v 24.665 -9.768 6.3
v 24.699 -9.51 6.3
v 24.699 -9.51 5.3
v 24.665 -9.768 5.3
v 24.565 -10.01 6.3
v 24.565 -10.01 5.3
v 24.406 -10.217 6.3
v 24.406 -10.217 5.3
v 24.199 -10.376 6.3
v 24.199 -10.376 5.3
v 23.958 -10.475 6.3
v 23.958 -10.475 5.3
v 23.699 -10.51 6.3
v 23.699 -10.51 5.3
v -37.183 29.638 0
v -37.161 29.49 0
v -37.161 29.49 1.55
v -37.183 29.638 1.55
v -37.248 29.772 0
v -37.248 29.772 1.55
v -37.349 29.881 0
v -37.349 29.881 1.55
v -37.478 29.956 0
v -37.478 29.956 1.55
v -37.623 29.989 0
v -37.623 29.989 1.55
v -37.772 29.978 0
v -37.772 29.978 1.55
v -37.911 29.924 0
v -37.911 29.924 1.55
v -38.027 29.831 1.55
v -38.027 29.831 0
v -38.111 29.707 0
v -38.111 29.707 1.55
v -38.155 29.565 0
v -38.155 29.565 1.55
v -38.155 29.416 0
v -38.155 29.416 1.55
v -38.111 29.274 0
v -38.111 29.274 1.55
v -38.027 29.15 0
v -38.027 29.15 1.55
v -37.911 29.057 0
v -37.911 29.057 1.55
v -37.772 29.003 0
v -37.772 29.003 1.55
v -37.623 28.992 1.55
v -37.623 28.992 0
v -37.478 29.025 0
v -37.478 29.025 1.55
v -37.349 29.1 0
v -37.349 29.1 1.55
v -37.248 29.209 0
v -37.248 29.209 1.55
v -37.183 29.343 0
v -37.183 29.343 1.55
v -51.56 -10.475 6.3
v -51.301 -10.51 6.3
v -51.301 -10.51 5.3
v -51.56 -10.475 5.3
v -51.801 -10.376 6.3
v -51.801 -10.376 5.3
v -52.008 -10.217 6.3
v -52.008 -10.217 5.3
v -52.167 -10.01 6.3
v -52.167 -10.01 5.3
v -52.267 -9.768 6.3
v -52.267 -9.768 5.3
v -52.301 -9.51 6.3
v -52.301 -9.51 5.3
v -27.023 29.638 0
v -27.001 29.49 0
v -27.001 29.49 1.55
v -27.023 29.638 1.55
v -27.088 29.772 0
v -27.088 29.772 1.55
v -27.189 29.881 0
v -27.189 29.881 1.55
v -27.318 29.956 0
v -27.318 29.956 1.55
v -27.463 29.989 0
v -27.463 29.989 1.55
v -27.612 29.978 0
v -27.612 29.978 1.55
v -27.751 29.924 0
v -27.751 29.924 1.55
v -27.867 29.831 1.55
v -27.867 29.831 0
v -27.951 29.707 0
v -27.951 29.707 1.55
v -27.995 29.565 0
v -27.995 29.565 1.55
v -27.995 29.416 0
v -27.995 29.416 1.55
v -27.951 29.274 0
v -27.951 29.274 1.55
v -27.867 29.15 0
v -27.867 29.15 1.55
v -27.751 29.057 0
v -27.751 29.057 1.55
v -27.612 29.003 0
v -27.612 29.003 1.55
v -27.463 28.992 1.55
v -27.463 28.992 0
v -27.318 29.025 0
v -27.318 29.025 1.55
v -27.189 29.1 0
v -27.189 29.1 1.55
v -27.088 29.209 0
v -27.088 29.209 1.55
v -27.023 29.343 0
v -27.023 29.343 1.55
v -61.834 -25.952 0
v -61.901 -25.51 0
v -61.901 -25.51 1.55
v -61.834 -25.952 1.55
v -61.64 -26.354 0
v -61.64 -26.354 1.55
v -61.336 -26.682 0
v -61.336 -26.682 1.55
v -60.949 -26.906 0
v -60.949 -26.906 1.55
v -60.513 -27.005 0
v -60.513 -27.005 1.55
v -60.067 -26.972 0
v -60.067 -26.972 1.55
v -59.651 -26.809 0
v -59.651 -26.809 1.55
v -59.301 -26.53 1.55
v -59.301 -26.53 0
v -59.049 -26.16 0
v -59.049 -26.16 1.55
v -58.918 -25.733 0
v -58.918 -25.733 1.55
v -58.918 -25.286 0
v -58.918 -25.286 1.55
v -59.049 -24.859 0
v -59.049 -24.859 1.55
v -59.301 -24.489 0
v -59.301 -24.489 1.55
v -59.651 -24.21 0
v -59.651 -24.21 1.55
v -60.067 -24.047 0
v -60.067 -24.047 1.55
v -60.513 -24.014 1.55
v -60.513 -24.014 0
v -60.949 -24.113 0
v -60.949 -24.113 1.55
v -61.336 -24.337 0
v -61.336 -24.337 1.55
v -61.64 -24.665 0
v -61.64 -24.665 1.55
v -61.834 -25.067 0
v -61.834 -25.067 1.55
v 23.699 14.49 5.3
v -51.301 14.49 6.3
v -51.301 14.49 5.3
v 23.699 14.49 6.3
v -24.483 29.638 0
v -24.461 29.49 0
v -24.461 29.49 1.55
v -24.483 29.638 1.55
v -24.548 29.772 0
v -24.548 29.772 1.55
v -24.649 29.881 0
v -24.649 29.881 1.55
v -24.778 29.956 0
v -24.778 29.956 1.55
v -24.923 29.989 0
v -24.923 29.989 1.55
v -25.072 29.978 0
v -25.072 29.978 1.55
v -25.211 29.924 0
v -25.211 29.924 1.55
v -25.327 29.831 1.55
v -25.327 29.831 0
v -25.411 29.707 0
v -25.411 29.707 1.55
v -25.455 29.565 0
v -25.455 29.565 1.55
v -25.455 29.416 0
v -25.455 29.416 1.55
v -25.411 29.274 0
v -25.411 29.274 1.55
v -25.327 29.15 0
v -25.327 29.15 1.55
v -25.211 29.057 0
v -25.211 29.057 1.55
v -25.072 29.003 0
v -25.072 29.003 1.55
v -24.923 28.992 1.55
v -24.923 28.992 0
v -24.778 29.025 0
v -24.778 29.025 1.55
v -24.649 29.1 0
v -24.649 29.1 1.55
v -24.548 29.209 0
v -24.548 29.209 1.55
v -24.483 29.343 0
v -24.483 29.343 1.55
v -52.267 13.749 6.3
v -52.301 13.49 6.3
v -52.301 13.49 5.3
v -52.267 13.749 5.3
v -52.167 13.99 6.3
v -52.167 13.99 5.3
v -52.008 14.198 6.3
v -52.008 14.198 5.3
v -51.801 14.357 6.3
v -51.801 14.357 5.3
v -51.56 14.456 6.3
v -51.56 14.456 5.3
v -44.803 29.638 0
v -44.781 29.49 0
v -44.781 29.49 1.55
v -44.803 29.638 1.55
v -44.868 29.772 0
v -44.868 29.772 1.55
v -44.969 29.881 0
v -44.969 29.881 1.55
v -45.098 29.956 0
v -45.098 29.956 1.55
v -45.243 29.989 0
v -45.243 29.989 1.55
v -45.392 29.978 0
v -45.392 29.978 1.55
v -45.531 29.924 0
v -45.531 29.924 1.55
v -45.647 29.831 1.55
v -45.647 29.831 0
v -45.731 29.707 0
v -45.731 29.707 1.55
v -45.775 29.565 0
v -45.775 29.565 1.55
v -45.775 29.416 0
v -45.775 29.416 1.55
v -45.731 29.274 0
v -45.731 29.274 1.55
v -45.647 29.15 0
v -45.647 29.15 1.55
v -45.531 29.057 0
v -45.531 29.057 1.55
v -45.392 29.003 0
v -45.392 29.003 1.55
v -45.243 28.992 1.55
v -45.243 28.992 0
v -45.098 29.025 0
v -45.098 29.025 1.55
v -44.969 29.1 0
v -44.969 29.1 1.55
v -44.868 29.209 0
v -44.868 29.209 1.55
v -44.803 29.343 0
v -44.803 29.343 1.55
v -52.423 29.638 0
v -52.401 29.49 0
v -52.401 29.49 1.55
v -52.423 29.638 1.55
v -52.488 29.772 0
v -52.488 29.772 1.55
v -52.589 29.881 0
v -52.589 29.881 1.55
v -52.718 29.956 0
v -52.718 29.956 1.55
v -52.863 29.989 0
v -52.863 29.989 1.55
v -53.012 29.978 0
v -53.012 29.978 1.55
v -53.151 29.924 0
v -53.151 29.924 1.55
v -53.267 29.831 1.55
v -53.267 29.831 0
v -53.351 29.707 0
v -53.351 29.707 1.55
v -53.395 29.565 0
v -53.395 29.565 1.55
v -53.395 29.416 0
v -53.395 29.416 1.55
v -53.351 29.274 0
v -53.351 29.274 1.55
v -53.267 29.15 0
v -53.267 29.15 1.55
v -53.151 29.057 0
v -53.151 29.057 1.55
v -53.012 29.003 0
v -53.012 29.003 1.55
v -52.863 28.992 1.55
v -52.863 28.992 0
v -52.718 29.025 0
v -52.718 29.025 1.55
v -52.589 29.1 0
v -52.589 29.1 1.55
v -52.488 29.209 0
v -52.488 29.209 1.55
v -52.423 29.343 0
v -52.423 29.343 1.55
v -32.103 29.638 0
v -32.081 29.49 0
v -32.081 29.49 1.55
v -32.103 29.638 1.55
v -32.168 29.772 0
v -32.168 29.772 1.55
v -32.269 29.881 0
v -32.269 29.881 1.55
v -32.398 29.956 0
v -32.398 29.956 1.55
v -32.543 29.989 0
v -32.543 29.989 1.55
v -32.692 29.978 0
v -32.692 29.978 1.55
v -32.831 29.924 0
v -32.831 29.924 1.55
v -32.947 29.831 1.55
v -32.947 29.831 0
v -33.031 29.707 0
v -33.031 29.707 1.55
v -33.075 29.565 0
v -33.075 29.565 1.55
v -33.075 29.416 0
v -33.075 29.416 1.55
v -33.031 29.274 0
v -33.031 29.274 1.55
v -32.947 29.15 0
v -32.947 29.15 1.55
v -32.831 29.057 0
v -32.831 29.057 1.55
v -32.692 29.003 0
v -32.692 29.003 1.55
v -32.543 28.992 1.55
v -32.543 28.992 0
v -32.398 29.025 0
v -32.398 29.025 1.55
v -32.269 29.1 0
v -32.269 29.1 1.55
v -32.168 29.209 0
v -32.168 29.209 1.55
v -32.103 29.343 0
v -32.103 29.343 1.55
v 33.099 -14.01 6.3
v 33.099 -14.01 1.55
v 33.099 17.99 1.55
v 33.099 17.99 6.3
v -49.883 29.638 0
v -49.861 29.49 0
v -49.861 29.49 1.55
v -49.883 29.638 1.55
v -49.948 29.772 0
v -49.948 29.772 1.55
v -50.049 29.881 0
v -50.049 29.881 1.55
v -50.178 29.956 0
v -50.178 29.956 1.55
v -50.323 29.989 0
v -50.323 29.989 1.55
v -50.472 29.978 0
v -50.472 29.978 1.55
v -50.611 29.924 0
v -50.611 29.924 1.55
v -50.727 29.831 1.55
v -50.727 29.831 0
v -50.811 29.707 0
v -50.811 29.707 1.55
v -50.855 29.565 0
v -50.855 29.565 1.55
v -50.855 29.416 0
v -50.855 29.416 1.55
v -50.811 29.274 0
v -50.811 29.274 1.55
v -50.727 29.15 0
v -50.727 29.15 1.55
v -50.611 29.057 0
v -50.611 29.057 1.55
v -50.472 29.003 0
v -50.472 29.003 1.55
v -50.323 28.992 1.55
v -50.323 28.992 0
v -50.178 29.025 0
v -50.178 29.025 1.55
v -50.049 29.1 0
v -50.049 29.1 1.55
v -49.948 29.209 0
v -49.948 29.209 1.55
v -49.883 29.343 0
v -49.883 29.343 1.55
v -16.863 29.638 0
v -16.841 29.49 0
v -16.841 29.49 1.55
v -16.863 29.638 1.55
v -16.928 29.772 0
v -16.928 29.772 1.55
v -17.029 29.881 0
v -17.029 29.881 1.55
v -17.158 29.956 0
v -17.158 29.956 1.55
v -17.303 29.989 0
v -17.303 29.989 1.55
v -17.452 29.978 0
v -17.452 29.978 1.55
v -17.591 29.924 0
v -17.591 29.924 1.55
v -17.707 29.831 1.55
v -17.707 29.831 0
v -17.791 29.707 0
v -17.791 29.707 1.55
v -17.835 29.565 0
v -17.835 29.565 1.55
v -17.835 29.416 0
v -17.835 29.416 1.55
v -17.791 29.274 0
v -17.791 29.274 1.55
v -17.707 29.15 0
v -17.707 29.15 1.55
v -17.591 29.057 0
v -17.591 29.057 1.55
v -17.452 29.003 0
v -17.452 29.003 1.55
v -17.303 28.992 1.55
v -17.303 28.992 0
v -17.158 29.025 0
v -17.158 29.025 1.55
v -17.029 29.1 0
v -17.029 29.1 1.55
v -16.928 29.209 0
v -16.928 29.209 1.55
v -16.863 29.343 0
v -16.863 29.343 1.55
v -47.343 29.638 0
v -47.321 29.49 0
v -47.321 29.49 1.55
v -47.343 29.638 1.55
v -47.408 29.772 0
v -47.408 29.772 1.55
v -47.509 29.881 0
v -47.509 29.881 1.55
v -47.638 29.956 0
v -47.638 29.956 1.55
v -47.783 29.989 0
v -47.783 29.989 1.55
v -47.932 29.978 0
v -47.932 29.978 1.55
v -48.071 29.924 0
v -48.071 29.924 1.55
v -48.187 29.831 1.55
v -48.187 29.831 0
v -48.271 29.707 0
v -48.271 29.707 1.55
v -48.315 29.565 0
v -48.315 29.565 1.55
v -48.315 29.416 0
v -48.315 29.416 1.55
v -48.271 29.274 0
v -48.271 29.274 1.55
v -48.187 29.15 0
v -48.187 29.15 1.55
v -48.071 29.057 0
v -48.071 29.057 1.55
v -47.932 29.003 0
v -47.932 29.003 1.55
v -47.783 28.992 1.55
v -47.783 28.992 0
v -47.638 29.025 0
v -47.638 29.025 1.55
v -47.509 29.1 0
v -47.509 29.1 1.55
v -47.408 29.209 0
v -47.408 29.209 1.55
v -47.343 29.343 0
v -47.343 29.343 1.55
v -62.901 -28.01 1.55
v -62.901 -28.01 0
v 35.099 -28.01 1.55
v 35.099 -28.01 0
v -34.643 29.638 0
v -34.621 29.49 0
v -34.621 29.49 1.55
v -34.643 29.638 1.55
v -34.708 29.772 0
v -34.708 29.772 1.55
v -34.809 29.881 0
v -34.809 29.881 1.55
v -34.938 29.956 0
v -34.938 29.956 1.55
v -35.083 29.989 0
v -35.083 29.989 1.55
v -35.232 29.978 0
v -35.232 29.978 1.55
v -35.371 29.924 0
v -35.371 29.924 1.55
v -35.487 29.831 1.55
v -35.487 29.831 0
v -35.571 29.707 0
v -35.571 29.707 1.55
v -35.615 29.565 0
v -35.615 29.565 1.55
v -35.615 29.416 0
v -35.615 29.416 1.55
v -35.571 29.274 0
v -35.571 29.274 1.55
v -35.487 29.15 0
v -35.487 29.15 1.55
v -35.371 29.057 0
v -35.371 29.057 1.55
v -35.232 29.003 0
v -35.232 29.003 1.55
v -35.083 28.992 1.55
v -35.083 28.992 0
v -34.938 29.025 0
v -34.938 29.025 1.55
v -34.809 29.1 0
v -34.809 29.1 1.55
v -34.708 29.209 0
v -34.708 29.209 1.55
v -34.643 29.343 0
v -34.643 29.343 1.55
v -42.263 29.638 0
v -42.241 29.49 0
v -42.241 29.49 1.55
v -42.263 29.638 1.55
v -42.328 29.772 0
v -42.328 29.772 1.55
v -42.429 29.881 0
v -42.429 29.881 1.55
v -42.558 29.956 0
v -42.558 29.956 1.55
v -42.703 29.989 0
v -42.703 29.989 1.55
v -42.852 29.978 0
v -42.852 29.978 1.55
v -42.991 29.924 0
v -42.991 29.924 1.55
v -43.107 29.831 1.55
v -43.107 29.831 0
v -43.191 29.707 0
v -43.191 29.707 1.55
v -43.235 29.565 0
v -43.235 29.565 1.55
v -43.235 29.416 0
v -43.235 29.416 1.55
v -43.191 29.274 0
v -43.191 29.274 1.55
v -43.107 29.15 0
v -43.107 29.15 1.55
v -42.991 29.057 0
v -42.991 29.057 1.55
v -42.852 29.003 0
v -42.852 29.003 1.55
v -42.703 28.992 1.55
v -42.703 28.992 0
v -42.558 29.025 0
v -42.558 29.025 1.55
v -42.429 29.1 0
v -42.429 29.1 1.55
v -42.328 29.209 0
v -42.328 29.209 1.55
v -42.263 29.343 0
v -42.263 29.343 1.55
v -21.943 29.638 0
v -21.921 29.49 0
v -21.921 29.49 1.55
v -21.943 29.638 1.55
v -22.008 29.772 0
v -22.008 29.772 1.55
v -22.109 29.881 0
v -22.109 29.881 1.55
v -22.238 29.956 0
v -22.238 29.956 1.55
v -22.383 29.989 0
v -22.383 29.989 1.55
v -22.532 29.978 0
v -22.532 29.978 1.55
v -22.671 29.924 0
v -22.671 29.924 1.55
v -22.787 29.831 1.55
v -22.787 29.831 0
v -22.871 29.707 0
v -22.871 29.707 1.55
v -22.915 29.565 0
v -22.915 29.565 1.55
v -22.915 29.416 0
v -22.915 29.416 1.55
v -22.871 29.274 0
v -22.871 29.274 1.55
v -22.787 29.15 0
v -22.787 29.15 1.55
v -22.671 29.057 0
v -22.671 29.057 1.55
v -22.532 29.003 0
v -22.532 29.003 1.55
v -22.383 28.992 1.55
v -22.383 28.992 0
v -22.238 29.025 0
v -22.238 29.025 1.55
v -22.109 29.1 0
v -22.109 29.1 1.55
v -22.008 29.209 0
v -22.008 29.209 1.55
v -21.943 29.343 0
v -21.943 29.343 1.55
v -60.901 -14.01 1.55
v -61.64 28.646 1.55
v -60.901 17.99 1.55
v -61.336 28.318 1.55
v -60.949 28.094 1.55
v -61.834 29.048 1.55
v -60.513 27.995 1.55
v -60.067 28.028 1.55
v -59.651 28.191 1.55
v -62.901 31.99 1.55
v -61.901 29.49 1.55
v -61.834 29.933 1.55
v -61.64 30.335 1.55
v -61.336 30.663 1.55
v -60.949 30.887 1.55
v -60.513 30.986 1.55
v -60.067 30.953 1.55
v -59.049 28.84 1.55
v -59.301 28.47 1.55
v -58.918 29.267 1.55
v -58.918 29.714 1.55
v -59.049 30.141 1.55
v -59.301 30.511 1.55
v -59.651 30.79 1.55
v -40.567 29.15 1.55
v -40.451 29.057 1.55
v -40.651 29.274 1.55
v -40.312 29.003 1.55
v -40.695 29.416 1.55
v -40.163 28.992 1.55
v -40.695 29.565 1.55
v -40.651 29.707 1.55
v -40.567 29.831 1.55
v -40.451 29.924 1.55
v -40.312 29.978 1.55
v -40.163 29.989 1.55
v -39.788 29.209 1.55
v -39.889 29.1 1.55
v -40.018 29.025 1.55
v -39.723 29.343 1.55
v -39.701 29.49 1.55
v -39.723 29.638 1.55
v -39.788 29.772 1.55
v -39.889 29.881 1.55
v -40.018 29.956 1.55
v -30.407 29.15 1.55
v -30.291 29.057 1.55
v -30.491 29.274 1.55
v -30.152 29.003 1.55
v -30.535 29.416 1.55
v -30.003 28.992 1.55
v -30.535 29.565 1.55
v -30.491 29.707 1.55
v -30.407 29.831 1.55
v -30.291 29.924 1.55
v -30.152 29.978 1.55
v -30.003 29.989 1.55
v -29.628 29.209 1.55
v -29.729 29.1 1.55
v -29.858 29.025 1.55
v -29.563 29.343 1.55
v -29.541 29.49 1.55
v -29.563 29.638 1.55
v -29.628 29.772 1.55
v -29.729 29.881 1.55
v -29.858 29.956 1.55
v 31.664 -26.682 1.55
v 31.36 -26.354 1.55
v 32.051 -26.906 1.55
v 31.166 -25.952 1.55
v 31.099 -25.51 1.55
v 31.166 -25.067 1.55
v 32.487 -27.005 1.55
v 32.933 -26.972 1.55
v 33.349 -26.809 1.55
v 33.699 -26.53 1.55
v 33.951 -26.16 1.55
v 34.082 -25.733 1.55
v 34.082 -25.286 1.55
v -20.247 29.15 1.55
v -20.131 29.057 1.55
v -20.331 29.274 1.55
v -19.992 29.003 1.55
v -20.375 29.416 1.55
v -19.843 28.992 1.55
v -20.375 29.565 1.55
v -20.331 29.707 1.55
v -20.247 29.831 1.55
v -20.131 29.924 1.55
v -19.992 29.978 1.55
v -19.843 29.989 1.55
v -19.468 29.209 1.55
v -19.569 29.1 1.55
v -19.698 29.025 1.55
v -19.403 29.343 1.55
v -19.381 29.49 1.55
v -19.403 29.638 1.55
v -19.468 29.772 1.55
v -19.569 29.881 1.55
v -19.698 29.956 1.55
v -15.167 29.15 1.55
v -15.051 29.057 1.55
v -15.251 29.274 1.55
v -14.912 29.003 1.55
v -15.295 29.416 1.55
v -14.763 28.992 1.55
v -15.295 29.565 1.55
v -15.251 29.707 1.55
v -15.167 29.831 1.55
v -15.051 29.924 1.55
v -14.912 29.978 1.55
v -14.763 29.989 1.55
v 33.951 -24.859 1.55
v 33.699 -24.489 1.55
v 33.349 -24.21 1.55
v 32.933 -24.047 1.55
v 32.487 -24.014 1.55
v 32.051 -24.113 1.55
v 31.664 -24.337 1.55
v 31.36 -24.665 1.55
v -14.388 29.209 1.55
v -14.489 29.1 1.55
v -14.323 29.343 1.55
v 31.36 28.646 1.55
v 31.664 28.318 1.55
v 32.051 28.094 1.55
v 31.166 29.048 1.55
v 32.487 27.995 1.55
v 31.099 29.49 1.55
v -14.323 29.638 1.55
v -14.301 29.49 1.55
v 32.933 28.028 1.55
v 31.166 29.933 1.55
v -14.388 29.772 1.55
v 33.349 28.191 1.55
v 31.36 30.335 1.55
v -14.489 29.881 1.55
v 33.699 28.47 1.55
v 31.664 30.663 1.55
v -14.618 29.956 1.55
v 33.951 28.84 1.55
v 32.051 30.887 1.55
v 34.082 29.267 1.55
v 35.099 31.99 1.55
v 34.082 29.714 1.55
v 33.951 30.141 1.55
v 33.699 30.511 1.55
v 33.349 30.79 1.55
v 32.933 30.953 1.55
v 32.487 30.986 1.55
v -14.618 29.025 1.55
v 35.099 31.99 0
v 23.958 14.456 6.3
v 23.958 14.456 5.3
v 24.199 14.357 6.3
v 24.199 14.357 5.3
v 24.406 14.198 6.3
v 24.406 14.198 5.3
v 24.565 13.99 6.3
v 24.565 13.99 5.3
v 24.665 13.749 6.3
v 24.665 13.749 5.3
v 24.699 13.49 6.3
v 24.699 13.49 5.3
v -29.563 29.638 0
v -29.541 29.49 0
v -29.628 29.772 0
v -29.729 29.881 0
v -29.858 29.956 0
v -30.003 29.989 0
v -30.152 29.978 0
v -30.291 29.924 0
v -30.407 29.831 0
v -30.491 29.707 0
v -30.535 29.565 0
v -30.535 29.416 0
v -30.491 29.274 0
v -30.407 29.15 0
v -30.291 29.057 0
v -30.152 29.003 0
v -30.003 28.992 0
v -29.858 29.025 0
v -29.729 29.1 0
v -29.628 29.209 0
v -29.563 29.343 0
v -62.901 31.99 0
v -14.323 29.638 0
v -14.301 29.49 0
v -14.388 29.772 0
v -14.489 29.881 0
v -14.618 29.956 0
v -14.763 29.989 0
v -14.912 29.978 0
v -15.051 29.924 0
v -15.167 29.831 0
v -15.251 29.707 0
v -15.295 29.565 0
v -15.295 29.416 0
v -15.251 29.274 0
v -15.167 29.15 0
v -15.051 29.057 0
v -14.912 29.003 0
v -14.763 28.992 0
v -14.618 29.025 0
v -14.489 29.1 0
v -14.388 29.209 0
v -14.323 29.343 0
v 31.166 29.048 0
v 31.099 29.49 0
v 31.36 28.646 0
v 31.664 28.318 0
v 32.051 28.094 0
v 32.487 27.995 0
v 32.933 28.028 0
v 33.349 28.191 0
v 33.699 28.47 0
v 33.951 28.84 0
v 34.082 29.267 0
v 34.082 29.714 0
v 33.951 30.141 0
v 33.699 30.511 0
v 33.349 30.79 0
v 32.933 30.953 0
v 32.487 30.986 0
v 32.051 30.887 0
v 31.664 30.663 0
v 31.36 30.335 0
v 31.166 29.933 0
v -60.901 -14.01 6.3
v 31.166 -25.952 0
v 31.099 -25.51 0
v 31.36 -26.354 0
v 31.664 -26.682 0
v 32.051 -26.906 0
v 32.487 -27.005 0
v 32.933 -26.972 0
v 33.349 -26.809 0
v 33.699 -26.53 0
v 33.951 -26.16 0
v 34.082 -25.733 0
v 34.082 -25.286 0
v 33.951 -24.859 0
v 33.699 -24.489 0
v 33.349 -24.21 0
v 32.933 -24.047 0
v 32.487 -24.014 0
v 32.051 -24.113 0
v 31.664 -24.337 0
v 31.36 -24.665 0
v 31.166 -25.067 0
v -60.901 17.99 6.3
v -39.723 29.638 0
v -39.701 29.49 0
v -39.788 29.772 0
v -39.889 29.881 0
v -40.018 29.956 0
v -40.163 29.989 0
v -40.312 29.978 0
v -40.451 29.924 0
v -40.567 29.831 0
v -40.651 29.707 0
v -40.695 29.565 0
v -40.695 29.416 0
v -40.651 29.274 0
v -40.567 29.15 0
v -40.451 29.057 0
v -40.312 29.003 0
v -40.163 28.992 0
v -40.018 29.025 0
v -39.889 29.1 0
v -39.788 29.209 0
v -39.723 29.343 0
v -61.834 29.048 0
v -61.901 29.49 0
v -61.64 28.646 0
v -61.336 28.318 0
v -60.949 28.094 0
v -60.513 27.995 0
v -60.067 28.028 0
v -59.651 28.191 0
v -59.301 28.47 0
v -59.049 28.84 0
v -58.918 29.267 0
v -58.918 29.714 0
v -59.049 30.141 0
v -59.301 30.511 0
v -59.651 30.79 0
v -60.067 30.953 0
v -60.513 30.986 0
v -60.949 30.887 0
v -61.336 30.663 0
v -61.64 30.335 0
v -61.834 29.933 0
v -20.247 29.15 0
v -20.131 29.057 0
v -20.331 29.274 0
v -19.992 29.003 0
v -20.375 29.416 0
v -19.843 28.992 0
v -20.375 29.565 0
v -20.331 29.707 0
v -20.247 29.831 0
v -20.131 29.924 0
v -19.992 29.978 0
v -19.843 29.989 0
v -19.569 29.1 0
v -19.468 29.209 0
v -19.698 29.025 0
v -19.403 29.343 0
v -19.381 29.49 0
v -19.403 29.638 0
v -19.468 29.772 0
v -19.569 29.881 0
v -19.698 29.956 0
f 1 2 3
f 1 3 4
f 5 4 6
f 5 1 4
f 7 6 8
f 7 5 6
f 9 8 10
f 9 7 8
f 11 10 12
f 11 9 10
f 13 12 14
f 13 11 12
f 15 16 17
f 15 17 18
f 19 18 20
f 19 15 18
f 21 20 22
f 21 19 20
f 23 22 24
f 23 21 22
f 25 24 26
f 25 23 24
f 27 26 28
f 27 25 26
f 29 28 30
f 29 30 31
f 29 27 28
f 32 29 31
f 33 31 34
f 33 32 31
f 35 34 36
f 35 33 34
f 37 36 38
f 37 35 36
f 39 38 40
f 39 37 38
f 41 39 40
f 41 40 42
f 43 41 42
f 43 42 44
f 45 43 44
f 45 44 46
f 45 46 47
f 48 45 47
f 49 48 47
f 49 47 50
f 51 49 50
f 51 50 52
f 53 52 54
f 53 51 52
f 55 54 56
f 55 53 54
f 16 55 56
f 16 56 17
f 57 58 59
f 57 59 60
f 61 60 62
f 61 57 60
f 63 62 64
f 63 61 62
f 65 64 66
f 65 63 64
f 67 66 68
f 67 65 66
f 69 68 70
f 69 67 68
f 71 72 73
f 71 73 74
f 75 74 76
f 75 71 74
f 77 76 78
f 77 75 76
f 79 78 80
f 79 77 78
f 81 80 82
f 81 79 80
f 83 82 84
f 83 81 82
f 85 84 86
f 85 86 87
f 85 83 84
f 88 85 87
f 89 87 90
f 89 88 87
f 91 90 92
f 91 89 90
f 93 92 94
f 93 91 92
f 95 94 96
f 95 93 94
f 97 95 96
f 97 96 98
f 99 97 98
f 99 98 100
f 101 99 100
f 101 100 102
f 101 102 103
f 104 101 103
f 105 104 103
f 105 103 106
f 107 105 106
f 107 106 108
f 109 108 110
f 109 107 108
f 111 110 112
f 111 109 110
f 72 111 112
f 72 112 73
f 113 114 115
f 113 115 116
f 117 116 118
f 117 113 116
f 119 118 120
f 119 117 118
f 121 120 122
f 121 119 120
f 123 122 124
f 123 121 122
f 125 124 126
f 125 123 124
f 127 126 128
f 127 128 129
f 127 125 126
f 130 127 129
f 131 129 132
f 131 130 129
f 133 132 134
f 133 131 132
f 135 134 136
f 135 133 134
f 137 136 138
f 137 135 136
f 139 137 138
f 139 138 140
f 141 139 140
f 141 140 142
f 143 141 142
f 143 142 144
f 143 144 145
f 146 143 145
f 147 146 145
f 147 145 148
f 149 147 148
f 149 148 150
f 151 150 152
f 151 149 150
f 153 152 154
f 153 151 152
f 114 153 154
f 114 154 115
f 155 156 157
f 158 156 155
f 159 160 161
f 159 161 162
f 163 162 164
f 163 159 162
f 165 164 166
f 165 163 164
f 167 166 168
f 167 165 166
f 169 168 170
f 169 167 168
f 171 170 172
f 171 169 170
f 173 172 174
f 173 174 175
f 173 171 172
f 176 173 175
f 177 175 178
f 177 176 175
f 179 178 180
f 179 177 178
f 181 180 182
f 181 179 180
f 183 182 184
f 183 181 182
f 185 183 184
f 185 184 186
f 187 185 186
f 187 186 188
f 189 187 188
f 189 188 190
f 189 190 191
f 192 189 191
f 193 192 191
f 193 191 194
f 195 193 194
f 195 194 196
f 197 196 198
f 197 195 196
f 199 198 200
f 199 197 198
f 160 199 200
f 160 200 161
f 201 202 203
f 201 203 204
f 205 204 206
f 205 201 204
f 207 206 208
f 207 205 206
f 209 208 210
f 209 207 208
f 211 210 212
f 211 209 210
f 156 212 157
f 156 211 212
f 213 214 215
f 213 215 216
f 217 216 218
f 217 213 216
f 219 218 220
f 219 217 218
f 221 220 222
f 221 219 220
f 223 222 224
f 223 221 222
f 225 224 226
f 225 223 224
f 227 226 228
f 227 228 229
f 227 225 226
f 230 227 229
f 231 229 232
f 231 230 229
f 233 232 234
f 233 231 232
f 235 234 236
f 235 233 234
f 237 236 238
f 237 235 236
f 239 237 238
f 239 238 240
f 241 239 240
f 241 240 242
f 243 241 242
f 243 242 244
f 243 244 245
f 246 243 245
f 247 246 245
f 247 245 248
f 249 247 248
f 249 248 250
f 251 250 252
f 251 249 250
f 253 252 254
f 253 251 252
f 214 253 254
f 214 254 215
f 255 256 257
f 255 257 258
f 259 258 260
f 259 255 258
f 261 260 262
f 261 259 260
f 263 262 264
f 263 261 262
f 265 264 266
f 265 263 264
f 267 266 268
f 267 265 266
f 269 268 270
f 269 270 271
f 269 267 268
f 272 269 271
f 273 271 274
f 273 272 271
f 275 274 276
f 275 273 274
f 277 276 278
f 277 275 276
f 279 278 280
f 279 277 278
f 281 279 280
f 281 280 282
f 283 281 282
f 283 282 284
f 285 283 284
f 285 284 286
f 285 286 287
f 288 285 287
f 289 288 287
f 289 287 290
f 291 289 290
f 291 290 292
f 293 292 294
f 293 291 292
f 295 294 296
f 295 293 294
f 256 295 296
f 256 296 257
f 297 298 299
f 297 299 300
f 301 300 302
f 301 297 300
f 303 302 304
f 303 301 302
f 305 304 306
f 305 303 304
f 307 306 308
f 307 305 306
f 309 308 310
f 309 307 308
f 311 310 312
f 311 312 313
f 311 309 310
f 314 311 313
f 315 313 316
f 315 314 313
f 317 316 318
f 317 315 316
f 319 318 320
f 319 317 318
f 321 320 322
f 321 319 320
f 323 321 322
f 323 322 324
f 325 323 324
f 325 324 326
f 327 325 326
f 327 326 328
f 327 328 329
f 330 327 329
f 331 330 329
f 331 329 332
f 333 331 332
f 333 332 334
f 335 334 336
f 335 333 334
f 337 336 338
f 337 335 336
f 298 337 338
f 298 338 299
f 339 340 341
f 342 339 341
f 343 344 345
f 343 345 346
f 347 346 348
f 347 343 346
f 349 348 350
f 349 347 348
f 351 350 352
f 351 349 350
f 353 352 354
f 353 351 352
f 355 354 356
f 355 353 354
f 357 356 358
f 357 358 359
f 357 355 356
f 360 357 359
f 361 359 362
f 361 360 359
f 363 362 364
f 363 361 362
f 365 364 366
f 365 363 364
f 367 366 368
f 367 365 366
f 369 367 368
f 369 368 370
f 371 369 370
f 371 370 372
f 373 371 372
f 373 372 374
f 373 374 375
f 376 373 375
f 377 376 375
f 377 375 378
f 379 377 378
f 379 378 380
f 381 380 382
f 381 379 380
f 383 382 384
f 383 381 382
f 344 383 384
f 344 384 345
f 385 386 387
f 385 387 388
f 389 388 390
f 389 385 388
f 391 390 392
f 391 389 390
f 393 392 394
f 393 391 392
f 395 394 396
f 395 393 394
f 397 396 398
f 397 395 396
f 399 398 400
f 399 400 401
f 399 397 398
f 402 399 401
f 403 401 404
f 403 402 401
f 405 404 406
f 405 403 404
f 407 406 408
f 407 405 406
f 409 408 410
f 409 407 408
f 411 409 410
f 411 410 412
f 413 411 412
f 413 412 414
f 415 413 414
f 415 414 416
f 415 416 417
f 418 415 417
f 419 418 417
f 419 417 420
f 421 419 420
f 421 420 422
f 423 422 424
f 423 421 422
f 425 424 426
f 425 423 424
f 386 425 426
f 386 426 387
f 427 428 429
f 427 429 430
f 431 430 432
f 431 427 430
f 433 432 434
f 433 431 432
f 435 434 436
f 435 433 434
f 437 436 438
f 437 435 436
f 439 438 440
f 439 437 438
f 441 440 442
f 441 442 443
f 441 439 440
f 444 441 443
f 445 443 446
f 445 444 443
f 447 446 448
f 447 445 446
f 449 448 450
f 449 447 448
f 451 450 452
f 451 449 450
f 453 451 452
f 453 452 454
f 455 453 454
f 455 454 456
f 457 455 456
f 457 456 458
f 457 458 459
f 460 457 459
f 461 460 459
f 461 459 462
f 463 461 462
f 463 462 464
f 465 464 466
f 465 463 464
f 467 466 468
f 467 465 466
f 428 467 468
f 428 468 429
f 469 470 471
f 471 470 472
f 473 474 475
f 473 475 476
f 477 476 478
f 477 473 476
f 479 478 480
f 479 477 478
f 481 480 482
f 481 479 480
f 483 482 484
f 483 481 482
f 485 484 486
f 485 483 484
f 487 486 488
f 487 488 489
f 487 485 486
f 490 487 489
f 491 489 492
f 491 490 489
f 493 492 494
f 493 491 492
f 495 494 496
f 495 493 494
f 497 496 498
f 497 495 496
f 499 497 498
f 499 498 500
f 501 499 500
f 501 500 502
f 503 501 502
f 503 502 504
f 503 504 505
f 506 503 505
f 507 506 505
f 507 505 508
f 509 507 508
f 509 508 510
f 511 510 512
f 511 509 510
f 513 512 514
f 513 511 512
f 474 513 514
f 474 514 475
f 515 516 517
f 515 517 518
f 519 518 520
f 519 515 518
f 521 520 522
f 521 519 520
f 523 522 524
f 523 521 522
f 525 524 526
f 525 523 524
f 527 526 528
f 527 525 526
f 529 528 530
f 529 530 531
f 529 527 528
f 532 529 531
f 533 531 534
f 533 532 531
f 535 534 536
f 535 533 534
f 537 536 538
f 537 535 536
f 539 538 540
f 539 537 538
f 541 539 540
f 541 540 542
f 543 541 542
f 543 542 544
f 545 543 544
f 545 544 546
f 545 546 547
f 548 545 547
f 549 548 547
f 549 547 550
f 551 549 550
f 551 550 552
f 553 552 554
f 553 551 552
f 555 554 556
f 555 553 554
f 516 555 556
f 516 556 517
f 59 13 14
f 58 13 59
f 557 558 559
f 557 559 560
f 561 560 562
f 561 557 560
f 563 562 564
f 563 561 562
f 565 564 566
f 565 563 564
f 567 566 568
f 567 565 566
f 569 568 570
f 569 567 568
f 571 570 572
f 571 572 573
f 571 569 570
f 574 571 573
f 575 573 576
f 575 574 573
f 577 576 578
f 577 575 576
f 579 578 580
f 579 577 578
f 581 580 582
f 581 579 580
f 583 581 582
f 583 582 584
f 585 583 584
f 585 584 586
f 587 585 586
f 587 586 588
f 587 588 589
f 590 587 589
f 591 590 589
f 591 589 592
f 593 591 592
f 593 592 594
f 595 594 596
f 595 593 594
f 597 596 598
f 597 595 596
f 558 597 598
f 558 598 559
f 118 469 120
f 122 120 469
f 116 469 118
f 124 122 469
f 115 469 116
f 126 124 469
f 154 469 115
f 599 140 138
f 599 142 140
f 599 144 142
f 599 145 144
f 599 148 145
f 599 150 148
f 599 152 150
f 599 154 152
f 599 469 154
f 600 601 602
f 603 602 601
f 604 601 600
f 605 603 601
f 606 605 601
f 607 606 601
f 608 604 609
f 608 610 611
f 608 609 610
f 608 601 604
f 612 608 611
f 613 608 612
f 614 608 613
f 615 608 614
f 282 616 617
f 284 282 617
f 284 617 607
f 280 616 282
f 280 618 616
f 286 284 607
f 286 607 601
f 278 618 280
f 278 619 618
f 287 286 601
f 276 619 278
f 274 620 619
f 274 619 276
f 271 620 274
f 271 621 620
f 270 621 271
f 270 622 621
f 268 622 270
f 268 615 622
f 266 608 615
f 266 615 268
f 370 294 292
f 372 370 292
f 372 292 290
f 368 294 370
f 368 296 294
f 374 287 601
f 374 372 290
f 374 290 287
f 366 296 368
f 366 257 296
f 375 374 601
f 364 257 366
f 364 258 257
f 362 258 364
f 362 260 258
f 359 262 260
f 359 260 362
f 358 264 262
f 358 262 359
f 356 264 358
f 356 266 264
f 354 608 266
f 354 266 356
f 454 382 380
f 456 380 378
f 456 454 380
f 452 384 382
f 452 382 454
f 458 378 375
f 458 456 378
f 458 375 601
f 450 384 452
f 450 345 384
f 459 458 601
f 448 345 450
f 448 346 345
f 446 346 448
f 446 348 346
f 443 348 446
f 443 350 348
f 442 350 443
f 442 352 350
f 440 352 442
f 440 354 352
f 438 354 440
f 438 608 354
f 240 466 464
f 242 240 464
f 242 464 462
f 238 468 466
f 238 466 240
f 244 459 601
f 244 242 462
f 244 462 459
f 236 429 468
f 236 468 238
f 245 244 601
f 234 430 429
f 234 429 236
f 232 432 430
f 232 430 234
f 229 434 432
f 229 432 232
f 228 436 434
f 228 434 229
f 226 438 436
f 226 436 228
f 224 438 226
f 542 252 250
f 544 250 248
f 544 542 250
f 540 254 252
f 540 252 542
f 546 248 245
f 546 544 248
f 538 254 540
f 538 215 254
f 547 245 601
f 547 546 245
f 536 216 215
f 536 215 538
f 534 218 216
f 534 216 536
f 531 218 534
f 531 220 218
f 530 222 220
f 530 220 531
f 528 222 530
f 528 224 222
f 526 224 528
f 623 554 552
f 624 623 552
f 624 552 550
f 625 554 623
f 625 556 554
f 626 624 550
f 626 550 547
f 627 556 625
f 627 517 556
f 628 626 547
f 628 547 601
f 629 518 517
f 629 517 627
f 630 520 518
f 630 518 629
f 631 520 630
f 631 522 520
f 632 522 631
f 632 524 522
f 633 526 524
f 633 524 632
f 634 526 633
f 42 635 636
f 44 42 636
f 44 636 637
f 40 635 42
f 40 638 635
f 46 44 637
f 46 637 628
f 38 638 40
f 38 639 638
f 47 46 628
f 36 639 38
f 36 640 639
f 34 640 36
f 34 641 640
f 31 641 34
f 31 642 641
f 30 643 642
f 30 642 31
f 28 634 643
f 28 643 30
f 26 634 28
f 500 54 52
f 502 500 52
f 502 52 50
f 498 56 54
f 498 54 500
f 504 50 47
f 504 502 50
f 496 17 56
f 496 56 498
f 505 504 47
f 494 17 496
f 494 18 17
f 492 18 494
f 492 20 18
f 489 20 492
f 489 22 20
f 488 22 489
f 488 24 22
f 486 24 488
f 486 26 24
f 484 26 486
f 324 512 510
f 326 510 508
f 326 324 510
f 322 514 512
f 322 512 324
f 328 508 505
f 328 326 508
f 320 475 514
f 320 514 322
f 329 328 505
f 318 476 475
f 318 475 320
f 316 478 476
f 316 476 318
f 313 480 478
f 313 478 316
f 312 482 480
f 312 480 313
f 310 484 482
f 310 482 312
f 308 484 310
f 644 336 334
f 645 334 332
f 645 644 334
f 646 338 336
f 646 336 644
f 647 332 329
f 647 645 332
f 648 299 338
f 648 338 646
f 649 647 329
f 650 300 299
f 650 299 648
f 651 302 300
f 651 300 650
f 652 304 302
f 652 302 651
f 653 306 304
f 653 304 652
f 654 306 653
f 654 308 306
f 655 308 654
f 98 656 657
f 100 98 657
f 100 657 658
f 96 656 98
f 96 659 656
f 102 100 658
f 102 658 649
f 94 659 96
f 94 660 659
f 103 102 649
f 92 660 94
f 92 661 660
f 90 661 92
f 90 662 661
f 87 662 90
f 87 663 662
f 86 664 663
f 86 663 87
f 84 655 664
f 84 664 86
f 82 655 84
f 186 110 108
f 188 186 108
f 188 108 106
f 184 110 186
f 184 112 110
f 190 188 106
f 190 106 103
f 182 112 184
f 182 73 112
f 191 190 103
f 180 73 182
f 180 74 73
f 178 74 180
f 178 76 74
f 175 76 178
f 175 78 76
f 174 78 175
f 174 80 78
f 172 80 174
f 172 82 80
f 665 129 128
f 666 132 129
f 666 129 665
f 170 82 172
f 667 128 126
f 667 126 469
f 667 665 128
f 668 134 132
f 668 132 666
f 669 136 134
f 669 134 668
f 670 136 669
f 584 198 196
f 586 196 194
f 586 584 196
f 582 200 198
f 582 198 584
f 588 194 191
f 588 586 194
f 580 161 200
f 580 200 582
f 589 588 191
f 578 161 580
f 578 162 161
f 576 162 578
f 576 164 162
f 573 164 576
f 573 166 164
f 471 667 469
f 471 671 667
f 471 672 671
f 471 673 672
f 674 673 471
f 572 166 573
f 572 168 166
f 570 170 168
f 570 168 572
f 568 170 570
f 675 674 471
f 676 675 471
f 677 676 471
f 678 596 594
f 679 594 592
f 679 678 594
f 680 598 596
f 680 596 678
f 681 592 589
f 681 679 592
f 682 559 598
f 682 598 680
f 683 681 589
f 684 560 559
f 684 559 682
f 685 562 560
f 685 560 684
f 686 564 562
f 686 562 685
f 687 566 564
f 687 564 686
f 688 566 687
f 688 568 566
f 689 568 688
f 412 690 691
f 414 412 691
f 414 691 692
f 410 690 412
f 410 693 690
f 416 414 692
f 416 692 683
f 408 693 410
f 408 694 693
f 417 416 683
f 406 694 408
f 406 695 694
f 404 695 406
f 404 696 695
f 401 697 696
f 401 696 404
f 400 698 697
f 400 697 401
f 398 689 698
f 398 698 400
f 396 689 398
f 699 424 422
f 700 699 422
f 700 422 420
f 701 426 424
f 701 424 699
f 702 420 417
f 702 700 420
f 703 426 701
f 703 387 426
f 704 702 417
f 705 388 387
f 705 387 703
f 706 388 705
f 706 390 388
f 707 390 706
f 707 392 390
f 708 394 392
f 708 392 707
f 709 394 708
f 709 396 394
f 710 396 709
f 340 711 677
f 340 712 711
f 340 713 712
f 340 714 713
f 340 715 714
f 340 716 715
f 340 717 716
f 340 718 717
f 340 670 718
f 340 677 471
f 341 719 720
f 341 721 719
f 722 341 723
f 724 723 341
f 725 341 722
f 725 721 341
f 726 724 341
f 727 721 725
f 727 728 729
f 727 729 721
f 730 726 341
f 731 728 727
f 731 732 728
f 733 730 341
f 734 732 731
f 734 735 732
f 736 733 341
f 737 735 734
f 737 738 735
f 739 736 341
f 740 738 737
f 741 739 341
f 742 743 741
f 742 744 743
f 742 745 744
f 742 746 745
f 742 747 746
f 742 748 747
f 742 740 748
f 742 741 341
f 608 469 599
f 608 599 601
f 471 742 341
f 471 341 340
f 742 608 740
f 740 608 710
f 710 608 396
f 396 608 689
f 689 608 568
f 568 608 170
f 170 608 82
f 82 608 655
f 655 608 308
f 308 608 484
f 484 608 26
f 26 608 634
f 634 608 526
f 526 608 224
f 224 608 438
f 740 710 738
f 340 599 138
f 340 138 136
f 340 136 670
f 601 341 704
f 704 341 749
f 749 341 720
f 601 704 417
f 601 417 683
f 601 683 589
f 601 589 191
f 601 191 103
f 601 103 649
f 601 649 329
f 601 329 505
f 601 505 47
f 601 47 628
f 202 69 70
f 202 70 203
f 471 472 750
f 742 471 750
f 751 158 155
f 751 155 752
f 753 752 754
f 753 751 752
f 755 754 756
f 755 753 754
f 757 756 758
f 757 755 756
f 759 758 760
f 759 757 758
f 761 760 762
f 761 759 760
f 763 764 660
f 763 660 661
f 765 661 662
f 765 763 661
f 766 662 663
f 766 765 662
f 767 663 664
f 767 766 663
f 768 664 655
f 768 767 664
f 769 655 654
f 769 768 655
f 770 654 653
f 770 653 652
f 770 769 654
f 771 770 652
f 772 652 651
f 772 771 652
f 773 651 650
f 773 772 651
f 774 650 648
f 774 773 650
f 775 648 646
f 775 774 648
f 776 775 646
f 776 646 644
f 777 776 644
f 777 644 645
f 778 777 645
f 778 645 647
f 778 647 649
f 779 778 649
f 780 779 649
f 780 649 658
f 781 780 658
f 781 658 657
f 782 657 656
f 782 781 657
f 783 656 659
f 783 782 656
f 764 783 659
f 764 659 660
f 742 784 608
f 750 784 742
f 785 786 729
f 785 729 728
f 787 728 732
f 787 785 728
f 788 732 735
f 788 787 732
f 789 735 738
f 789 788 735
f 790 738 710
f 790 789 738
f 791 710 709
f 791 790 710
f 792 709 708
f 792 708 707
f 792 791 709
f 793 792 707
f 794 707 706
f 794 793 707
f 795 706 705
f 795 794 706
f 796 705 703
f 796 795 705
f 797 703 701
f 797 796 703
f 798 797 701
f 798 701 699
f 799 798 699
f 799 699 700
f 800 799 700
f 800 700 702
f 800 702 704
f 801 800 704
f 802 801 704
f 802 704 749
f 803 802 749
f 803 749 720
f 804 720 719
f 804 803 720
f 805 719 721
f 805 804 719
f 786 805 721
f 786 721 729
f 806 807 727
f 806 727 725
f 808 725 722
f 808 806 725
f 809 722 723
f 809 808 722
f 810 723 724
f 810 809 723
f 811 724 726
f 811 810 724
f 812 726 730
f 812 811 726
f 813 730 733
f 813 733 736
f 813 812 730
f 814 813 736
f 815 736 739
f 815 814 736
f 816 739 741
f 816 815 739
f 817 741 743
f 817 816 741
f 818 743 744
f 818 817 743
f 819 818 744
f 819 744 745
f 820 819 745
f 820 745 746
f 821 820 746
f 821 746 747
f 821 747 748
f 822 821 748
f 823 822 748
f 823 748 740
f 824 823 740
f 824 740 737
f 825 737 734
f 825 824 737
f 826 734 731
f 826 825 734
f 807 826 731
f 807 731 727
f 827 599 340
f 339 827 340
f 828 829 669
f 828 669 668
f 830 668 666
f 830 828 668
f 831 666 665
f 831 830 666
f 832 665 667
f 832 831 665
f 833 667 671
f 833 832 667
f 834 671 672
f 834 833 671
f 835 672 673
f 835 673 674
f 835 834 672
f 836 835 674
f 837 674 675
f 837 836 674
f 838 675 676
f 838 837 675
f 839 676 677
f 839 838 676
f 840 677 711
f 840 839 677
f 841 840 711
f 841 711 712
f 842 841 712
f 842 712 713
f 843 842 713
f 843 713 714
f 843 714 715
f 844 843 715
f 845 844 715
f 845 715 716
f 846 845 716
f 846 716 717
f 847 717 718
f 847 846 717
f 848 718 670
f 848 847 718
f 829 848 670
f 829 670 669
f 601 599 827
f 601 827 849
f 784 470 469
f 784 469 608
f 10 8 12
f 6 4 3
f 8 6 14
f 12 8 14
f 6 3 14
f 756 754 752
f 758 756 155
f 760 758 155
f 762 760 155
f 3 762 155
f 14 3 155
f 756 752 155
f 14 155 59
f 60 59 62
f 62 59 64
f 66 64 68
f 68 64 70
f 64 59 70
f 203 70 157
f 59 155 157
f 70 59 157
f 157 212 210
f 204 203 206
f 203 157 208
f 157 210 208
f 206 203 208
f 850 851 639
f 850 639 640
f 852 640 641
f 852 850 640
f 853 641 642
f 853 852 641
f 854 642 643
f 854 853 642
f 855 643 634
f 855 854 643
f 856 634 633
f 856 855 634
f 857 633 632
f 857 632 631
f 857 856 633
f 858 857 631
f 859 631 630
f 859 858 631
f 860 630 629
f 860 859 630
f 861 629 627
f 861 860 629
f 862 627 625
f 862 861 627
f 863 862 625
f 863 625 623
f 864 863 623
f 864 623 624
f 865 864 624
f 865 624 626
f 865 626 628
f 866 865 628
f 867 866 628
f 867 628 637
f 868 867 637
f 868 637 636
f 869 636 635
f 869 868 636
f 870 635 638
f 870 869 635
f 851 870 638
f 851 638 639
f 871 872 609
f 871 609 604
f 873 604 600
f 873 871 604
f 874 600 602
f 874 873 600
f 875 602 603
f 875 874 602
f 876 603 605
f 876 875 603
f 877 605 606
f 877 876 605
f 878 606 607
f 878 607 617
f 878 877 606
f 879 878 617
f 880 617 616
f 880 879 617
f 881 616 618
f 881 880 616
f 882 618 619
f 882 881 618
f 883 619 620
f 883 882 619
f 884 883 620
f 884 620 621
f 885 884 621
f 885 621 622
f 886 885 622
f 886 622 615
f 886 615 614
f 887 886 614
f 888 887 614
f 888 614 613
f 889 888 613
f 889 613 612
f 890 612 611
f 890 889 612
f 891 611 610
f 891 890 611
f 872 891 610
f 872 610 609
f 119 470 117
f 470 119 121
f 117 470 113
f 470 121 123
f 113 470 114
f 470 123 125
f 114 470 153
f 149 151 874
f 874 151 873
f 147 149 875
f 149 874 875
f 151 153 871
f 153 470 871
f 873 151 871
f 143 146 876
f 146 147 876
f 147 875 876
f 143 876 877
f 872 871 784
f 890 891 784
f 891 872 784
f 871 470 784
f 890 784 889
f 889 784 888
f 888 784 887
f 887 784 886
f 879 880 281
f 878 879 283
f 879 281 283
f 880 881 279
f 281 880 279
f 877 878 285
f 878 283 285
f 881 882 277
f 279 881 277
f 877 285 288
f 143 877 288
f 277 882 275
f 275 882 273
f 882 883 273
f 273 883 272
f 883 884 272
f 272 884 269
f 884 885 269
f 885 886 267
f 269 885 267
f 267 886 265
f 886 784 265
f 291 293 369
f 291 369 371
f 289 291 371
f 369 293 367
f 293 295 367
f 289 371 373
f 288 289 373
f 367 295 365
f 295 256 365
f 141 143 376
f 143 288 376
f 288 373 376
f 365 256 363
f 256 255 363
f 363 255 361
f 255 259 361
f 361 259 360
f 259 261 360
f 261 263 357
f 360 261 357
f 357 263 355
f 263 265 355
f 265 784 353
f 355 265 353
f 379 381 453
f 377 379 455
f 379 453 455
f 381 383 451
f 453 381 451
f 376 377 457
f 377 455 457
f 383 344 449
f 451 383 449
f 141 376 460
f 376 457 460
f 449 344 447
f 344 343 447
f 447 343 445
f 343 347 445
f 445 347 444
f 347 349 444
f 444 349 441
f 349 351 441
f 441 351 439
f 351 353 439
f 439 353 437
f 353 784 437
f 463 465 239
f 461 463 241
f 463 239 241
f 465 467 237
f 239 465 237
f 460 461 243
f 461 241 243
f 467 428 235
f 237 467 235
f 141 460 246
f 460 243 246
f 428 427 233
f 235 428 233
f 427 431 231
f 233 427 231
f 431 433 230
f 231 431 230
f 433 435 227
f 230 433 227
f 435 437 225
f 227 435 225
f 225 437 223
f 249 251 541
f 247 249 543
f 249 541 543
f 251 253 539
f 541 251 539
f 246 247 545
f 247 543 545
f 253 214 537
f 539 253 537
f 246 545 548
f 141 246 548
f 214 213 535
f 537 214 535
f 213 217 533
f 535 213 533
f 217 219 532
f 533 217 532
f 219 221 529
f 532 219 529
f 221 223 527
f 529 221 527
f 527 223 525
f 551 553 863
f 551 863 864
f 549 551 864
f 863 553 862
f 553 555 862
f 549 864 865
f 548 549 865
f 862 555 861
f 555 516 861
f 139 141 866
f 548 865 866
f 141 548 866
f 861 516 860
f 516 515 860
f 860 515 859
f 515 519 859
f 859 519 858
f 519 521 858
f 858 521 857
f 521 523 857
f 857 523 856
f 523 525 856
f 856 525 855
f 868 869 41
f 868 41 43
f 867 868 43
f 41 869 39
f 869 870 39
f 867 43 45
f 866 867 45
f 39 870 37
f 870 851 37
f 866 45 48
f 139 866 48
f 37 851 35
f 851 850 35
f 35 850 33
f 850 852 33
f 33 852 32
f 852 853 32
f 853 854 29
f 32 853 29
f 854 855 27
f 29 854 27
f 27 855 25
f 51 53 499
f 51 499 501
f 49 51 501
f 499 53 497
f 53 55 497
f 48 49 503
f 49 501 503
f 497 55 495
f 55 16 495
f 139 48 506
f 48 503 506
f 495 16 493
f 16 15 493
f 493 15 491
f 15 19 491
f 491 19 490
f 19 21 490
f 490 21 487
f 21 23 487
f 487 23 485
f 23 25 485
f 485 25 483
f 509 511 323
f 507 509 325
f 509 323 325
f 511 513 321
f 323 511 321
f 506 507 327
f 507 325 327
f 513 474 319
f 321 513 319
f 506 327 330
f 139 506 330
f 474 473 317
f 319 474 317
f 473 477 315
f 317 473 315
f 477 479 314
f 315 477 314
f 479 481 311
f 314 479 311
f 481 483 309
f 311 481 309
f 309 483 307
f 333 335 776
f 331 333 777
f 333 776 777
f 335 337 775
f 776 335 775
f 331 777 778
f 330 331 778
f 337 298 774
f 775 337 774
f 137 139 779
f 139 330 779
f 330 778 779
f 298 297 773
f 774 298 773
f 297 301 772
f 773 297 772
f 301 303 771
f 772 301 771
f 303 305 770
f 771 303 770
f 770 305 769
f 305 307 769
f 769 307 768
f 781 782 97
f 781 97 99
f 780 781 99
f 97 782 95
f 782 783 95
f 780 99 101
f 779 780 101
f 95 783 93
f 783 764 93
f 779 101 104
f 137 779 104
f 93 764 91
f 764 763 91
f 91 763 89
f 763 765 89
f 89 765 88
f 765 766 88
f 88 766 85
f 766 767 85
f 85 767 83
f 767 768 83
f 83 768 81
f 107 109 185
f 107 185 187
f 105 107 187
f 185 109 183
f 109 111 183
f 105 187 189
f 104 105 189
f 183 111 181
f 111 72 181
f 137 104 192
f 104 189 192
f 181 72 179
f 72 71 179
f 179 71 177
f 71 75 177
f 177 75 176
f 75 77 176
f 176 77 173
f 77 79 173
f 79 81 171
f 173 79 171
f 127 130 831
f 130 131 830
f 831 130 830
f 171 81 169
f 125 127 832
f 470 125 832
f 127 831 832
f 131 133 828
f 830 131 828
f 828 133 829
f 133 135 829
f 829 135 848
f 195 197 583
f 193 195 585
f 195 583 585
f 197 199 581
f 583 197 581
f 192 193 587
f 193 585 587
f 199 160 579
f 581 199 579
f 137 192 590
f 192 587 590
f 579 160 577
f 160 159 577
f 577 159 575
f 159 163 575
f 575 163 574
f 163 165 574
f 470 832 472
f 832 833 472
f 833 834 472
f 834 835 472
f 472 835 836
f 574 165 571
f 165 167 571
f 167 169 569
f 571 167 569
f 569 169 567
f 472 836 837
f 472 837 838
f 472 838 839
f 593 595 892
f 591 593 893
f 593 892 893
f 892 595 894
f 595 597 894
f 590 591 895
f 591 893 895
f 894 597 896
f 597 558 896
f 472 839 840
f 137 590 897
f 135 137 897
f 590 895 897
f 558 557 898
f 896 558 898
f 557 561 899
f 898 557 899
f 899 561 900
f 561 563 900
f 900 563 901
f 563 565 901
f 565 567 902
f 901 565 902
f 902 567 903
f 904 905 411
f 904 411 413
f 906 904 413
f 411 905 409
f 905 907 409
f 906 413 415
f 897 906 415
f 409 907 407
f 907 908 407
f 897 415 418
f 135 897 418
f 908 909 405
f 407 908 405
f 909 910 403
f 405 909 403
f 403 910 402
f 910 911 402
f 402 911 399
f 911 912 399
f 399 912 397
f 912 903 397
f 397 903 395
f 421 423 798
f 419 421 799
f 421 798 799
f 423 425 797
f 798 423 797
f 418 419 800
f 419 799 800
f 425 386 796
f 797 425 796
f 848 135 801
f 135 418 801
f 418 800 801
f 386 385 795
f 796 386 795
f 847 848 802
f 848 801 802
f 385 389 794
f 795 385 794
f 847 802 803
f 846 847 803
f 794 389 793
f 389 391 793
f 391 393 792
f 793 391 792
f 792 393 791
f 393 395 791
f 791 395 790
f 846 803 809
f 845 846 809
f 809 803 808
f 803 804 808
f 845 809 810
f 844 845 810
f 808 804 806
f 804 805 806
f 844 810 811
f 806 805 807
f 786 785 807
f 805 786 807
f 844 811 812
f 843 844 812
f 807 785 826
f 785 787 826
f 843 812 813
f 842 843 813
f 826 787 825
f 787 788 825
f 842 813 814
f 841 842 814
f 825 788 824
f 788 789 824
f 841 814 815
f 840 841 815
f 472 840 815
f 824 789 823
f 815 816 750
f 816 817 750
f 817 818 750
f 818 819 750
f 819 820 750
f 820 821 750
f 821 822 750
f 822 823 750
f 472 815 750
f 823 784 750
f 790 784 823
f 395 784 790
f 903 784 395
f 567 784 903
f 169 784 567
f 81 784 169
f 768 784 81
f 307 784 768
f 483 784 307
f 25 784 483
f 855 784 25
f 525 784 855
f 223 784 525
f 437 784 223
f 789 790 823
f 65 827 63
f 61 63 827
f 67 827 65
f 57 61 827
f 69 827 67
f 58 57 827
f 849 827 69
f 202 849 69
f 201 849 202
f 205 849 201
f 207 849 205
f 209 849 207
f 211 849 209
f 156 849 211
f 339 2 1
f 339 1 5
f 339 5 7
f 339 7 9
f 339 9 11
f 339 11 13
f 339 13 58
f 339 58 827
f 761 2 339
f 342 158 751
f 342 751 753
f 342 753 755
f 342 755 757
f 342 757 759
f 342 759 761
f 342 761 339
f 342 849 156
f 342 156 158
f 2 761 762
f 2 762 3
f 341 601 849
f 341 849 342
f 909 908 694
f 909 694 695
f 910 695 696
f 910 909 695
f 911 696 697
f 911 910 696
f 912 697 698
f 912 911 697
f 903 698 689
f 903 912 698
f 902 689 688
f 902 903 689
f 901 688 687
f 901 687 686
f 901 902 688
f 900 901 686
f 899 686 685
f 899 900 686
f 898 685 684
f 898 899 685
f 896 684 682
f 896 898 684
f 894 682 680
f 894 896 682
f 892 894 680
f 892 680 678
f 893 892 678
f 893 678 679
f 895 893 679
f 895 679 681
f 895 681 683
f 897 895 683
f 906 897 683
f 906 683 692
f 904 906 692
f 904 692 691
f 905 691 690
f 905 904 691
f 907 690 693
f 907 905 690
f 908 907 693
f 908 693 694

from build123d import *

# Parameters (mm, degrees)
ESQUISSE1_W             = 98
ESQUISSE1_H             = 60
ESQUISSE1_R             = 1.5
ESQUISSE1_R_2           = 0.5
BOSS_EXTRU_1_DEPTH      = 1.55
ESQUISSE2_W             = 94
ESQUISSE2_H             = 32
BOSS_EXTRU_2_DEPTH      = 4.75
ENL_V_MAT_EXTRU_2_DEPTH = 1


with BuildPart() as part:
    # Esquisse1 → Boss.-Extru.1 (new body)
    with BuildSketch(Plane.XY):
        with Locations((-13.900836029, 1.990498339)):
            Rectangle(ESQUISSE1_W, ESQUISSE1_H)
        with Locations(Location((-60.400836029, 29.490498339, 0), (0, 0, 180))):
            Circle(ESQUISSE1_R, mode=Mode.SUBTRACT)
        with Locations(Location((32.599163971, 29.490498339, 0), (0, 0, 180))):
            Circle(ESQUISSE1_R, mode=Mode.SUBTRACT)
        with Locations(Location((32.599163971, -25.509501661, 0), (0, 0, 180))):
            Circle(ESQUISSE1_R, mode=Mode.SUBTRACT)
        with Locations(Location((-60.400836029, -25.509501661, 0), (0, 0, 180))):
            Circle(ESQUISSE1_R, mode=Mode.SUBTRACT)
        with Locations((-52.900836029, 29.490498339)):
            Circle(ESQUISSE1_R_2, mode=Mode.SUBTRACT)
        with Locations((-50.360836029, 29.490498339)):
            Circle(ESQUISSE1_R_2, mode=Mode.SUBTRACT)
        with Locations((-47.820836029, 29.490498339)):
            Circle(ESQUISSE1_R_2, mode=Mode.SUBTRACT)
        with Locations((-45.280836029, 29.490498339)):
            Circle(ESQUISSE1_R_2, mode=Mode.SUBTRACT)
        with Locations((-42.740836029, 29.490498339)):
            Circle(ESQUISSE1_R_2, mode=Mode.SUBTRACT)
        with Locations((-40.200836029, 29.490498339)):
            Circle(ESQUISSE1_R_2, mode=Mode.SUBTRACT)
        with Locations((-37.660836029, 29.490498339)):
            Circle(ESQUISSE1_R_2, mode=Mode.SUBTRACT)
        with Locations((-35.120836029, 29.490498339)):
            Circle(ESQUISSE1_R_2, mode=Mode.SUBTRACT)
        with Locations((-32.580836029, 29.490498339)):
            Circle(ESQUISSE1_R_2, mode=Mode.SUBTRACT)
        with Locations((-30.040836029, 29.490498339)):
            Circle(ESQUISSE1_R_2, mode=Mode.SUBTRACT)
        with Locations((-27.500836029, 29.490498339)):
            Circle(ESQUISSE1_R_2, mode=Mode.SUBTRACT)
        with Locations((-24.960836029, 29.490498339)):
            Circle(ESQUISSE1_R_2, mode=Mode.SUBTRACT)
        with Locations((-22.420836029, 29.490498339)):
            Circle(ESQUISSE1_R_2, mode=Mode.SUBTRACT)
        with Locations((-19.880836029, 29.490498339)):
            Circle(ESQUISSE1_R_2, mode=Mode.SUBTRACT)
        with Locations((-17.340836029, 29.490498339)):
            Circle(ESQUISSE1_R_2, mode=Mode.SUBTRACT)
        with Locations((-14.800836029, 29.490498339)):
            Circle(ESQUISSE1_R_2, mode=Mode.SUBTRACT)
    extrude(amount=BOSS_EXTRU_1_DEPTH)

    # Esquisse2 → Boss.-Extru.2 (add)
    with BuildSketch(Plane.XY.offset(1.55)):
        with Locations((-13.900836029, 1.990498339)):
            Rectangle(ESQUISSE2_W, ESQUISSE2_H)
    extrude(amount=BOSS_EXTRU_2_DEPTH)

    # Esquisse5 → Enlèv. mat.-Extru.2 (cut)
    with BuildSketch(Plane.XY.offset(6.3)):
        with BuildLine():
            Line((-51.300836029, 14.490498339), (23.699163971, 14.490498339))
            ThreePointArc((23.699163971, 14.490498339), (24.406270752, 14.19760512), (24.699163971, 13.490498339))
            Line((24.699163971, 13.490498339), (24.699163971, -9.509501661))
            ThreePointArc((24.699163971, -9.509501661), (24.406270752, -10.216608442), (23.699163971, -10.509501661))
            Line((23.699163971, -10.509501661), (-51.300836029, -10.509501661))
            ThreePointArc((-51.300836029, -10.509501661), (-52.00794281, -10.216608442), (-52.300836029, -9.509501661))
            Line((-52.300836029, -9.509501661), (-52.300836029, 13.490498339))
            ThreePointArc((-52.300836029, 13.490498339), (-52.00794281, 14.19760512), (-51.300836029, 14.490498339))
        make_face()
    extrude(amount=-ENL_V_MAT_EXTRU_2_DEPTH, mode=Mode.SUBTRACT)


solid = part.part
